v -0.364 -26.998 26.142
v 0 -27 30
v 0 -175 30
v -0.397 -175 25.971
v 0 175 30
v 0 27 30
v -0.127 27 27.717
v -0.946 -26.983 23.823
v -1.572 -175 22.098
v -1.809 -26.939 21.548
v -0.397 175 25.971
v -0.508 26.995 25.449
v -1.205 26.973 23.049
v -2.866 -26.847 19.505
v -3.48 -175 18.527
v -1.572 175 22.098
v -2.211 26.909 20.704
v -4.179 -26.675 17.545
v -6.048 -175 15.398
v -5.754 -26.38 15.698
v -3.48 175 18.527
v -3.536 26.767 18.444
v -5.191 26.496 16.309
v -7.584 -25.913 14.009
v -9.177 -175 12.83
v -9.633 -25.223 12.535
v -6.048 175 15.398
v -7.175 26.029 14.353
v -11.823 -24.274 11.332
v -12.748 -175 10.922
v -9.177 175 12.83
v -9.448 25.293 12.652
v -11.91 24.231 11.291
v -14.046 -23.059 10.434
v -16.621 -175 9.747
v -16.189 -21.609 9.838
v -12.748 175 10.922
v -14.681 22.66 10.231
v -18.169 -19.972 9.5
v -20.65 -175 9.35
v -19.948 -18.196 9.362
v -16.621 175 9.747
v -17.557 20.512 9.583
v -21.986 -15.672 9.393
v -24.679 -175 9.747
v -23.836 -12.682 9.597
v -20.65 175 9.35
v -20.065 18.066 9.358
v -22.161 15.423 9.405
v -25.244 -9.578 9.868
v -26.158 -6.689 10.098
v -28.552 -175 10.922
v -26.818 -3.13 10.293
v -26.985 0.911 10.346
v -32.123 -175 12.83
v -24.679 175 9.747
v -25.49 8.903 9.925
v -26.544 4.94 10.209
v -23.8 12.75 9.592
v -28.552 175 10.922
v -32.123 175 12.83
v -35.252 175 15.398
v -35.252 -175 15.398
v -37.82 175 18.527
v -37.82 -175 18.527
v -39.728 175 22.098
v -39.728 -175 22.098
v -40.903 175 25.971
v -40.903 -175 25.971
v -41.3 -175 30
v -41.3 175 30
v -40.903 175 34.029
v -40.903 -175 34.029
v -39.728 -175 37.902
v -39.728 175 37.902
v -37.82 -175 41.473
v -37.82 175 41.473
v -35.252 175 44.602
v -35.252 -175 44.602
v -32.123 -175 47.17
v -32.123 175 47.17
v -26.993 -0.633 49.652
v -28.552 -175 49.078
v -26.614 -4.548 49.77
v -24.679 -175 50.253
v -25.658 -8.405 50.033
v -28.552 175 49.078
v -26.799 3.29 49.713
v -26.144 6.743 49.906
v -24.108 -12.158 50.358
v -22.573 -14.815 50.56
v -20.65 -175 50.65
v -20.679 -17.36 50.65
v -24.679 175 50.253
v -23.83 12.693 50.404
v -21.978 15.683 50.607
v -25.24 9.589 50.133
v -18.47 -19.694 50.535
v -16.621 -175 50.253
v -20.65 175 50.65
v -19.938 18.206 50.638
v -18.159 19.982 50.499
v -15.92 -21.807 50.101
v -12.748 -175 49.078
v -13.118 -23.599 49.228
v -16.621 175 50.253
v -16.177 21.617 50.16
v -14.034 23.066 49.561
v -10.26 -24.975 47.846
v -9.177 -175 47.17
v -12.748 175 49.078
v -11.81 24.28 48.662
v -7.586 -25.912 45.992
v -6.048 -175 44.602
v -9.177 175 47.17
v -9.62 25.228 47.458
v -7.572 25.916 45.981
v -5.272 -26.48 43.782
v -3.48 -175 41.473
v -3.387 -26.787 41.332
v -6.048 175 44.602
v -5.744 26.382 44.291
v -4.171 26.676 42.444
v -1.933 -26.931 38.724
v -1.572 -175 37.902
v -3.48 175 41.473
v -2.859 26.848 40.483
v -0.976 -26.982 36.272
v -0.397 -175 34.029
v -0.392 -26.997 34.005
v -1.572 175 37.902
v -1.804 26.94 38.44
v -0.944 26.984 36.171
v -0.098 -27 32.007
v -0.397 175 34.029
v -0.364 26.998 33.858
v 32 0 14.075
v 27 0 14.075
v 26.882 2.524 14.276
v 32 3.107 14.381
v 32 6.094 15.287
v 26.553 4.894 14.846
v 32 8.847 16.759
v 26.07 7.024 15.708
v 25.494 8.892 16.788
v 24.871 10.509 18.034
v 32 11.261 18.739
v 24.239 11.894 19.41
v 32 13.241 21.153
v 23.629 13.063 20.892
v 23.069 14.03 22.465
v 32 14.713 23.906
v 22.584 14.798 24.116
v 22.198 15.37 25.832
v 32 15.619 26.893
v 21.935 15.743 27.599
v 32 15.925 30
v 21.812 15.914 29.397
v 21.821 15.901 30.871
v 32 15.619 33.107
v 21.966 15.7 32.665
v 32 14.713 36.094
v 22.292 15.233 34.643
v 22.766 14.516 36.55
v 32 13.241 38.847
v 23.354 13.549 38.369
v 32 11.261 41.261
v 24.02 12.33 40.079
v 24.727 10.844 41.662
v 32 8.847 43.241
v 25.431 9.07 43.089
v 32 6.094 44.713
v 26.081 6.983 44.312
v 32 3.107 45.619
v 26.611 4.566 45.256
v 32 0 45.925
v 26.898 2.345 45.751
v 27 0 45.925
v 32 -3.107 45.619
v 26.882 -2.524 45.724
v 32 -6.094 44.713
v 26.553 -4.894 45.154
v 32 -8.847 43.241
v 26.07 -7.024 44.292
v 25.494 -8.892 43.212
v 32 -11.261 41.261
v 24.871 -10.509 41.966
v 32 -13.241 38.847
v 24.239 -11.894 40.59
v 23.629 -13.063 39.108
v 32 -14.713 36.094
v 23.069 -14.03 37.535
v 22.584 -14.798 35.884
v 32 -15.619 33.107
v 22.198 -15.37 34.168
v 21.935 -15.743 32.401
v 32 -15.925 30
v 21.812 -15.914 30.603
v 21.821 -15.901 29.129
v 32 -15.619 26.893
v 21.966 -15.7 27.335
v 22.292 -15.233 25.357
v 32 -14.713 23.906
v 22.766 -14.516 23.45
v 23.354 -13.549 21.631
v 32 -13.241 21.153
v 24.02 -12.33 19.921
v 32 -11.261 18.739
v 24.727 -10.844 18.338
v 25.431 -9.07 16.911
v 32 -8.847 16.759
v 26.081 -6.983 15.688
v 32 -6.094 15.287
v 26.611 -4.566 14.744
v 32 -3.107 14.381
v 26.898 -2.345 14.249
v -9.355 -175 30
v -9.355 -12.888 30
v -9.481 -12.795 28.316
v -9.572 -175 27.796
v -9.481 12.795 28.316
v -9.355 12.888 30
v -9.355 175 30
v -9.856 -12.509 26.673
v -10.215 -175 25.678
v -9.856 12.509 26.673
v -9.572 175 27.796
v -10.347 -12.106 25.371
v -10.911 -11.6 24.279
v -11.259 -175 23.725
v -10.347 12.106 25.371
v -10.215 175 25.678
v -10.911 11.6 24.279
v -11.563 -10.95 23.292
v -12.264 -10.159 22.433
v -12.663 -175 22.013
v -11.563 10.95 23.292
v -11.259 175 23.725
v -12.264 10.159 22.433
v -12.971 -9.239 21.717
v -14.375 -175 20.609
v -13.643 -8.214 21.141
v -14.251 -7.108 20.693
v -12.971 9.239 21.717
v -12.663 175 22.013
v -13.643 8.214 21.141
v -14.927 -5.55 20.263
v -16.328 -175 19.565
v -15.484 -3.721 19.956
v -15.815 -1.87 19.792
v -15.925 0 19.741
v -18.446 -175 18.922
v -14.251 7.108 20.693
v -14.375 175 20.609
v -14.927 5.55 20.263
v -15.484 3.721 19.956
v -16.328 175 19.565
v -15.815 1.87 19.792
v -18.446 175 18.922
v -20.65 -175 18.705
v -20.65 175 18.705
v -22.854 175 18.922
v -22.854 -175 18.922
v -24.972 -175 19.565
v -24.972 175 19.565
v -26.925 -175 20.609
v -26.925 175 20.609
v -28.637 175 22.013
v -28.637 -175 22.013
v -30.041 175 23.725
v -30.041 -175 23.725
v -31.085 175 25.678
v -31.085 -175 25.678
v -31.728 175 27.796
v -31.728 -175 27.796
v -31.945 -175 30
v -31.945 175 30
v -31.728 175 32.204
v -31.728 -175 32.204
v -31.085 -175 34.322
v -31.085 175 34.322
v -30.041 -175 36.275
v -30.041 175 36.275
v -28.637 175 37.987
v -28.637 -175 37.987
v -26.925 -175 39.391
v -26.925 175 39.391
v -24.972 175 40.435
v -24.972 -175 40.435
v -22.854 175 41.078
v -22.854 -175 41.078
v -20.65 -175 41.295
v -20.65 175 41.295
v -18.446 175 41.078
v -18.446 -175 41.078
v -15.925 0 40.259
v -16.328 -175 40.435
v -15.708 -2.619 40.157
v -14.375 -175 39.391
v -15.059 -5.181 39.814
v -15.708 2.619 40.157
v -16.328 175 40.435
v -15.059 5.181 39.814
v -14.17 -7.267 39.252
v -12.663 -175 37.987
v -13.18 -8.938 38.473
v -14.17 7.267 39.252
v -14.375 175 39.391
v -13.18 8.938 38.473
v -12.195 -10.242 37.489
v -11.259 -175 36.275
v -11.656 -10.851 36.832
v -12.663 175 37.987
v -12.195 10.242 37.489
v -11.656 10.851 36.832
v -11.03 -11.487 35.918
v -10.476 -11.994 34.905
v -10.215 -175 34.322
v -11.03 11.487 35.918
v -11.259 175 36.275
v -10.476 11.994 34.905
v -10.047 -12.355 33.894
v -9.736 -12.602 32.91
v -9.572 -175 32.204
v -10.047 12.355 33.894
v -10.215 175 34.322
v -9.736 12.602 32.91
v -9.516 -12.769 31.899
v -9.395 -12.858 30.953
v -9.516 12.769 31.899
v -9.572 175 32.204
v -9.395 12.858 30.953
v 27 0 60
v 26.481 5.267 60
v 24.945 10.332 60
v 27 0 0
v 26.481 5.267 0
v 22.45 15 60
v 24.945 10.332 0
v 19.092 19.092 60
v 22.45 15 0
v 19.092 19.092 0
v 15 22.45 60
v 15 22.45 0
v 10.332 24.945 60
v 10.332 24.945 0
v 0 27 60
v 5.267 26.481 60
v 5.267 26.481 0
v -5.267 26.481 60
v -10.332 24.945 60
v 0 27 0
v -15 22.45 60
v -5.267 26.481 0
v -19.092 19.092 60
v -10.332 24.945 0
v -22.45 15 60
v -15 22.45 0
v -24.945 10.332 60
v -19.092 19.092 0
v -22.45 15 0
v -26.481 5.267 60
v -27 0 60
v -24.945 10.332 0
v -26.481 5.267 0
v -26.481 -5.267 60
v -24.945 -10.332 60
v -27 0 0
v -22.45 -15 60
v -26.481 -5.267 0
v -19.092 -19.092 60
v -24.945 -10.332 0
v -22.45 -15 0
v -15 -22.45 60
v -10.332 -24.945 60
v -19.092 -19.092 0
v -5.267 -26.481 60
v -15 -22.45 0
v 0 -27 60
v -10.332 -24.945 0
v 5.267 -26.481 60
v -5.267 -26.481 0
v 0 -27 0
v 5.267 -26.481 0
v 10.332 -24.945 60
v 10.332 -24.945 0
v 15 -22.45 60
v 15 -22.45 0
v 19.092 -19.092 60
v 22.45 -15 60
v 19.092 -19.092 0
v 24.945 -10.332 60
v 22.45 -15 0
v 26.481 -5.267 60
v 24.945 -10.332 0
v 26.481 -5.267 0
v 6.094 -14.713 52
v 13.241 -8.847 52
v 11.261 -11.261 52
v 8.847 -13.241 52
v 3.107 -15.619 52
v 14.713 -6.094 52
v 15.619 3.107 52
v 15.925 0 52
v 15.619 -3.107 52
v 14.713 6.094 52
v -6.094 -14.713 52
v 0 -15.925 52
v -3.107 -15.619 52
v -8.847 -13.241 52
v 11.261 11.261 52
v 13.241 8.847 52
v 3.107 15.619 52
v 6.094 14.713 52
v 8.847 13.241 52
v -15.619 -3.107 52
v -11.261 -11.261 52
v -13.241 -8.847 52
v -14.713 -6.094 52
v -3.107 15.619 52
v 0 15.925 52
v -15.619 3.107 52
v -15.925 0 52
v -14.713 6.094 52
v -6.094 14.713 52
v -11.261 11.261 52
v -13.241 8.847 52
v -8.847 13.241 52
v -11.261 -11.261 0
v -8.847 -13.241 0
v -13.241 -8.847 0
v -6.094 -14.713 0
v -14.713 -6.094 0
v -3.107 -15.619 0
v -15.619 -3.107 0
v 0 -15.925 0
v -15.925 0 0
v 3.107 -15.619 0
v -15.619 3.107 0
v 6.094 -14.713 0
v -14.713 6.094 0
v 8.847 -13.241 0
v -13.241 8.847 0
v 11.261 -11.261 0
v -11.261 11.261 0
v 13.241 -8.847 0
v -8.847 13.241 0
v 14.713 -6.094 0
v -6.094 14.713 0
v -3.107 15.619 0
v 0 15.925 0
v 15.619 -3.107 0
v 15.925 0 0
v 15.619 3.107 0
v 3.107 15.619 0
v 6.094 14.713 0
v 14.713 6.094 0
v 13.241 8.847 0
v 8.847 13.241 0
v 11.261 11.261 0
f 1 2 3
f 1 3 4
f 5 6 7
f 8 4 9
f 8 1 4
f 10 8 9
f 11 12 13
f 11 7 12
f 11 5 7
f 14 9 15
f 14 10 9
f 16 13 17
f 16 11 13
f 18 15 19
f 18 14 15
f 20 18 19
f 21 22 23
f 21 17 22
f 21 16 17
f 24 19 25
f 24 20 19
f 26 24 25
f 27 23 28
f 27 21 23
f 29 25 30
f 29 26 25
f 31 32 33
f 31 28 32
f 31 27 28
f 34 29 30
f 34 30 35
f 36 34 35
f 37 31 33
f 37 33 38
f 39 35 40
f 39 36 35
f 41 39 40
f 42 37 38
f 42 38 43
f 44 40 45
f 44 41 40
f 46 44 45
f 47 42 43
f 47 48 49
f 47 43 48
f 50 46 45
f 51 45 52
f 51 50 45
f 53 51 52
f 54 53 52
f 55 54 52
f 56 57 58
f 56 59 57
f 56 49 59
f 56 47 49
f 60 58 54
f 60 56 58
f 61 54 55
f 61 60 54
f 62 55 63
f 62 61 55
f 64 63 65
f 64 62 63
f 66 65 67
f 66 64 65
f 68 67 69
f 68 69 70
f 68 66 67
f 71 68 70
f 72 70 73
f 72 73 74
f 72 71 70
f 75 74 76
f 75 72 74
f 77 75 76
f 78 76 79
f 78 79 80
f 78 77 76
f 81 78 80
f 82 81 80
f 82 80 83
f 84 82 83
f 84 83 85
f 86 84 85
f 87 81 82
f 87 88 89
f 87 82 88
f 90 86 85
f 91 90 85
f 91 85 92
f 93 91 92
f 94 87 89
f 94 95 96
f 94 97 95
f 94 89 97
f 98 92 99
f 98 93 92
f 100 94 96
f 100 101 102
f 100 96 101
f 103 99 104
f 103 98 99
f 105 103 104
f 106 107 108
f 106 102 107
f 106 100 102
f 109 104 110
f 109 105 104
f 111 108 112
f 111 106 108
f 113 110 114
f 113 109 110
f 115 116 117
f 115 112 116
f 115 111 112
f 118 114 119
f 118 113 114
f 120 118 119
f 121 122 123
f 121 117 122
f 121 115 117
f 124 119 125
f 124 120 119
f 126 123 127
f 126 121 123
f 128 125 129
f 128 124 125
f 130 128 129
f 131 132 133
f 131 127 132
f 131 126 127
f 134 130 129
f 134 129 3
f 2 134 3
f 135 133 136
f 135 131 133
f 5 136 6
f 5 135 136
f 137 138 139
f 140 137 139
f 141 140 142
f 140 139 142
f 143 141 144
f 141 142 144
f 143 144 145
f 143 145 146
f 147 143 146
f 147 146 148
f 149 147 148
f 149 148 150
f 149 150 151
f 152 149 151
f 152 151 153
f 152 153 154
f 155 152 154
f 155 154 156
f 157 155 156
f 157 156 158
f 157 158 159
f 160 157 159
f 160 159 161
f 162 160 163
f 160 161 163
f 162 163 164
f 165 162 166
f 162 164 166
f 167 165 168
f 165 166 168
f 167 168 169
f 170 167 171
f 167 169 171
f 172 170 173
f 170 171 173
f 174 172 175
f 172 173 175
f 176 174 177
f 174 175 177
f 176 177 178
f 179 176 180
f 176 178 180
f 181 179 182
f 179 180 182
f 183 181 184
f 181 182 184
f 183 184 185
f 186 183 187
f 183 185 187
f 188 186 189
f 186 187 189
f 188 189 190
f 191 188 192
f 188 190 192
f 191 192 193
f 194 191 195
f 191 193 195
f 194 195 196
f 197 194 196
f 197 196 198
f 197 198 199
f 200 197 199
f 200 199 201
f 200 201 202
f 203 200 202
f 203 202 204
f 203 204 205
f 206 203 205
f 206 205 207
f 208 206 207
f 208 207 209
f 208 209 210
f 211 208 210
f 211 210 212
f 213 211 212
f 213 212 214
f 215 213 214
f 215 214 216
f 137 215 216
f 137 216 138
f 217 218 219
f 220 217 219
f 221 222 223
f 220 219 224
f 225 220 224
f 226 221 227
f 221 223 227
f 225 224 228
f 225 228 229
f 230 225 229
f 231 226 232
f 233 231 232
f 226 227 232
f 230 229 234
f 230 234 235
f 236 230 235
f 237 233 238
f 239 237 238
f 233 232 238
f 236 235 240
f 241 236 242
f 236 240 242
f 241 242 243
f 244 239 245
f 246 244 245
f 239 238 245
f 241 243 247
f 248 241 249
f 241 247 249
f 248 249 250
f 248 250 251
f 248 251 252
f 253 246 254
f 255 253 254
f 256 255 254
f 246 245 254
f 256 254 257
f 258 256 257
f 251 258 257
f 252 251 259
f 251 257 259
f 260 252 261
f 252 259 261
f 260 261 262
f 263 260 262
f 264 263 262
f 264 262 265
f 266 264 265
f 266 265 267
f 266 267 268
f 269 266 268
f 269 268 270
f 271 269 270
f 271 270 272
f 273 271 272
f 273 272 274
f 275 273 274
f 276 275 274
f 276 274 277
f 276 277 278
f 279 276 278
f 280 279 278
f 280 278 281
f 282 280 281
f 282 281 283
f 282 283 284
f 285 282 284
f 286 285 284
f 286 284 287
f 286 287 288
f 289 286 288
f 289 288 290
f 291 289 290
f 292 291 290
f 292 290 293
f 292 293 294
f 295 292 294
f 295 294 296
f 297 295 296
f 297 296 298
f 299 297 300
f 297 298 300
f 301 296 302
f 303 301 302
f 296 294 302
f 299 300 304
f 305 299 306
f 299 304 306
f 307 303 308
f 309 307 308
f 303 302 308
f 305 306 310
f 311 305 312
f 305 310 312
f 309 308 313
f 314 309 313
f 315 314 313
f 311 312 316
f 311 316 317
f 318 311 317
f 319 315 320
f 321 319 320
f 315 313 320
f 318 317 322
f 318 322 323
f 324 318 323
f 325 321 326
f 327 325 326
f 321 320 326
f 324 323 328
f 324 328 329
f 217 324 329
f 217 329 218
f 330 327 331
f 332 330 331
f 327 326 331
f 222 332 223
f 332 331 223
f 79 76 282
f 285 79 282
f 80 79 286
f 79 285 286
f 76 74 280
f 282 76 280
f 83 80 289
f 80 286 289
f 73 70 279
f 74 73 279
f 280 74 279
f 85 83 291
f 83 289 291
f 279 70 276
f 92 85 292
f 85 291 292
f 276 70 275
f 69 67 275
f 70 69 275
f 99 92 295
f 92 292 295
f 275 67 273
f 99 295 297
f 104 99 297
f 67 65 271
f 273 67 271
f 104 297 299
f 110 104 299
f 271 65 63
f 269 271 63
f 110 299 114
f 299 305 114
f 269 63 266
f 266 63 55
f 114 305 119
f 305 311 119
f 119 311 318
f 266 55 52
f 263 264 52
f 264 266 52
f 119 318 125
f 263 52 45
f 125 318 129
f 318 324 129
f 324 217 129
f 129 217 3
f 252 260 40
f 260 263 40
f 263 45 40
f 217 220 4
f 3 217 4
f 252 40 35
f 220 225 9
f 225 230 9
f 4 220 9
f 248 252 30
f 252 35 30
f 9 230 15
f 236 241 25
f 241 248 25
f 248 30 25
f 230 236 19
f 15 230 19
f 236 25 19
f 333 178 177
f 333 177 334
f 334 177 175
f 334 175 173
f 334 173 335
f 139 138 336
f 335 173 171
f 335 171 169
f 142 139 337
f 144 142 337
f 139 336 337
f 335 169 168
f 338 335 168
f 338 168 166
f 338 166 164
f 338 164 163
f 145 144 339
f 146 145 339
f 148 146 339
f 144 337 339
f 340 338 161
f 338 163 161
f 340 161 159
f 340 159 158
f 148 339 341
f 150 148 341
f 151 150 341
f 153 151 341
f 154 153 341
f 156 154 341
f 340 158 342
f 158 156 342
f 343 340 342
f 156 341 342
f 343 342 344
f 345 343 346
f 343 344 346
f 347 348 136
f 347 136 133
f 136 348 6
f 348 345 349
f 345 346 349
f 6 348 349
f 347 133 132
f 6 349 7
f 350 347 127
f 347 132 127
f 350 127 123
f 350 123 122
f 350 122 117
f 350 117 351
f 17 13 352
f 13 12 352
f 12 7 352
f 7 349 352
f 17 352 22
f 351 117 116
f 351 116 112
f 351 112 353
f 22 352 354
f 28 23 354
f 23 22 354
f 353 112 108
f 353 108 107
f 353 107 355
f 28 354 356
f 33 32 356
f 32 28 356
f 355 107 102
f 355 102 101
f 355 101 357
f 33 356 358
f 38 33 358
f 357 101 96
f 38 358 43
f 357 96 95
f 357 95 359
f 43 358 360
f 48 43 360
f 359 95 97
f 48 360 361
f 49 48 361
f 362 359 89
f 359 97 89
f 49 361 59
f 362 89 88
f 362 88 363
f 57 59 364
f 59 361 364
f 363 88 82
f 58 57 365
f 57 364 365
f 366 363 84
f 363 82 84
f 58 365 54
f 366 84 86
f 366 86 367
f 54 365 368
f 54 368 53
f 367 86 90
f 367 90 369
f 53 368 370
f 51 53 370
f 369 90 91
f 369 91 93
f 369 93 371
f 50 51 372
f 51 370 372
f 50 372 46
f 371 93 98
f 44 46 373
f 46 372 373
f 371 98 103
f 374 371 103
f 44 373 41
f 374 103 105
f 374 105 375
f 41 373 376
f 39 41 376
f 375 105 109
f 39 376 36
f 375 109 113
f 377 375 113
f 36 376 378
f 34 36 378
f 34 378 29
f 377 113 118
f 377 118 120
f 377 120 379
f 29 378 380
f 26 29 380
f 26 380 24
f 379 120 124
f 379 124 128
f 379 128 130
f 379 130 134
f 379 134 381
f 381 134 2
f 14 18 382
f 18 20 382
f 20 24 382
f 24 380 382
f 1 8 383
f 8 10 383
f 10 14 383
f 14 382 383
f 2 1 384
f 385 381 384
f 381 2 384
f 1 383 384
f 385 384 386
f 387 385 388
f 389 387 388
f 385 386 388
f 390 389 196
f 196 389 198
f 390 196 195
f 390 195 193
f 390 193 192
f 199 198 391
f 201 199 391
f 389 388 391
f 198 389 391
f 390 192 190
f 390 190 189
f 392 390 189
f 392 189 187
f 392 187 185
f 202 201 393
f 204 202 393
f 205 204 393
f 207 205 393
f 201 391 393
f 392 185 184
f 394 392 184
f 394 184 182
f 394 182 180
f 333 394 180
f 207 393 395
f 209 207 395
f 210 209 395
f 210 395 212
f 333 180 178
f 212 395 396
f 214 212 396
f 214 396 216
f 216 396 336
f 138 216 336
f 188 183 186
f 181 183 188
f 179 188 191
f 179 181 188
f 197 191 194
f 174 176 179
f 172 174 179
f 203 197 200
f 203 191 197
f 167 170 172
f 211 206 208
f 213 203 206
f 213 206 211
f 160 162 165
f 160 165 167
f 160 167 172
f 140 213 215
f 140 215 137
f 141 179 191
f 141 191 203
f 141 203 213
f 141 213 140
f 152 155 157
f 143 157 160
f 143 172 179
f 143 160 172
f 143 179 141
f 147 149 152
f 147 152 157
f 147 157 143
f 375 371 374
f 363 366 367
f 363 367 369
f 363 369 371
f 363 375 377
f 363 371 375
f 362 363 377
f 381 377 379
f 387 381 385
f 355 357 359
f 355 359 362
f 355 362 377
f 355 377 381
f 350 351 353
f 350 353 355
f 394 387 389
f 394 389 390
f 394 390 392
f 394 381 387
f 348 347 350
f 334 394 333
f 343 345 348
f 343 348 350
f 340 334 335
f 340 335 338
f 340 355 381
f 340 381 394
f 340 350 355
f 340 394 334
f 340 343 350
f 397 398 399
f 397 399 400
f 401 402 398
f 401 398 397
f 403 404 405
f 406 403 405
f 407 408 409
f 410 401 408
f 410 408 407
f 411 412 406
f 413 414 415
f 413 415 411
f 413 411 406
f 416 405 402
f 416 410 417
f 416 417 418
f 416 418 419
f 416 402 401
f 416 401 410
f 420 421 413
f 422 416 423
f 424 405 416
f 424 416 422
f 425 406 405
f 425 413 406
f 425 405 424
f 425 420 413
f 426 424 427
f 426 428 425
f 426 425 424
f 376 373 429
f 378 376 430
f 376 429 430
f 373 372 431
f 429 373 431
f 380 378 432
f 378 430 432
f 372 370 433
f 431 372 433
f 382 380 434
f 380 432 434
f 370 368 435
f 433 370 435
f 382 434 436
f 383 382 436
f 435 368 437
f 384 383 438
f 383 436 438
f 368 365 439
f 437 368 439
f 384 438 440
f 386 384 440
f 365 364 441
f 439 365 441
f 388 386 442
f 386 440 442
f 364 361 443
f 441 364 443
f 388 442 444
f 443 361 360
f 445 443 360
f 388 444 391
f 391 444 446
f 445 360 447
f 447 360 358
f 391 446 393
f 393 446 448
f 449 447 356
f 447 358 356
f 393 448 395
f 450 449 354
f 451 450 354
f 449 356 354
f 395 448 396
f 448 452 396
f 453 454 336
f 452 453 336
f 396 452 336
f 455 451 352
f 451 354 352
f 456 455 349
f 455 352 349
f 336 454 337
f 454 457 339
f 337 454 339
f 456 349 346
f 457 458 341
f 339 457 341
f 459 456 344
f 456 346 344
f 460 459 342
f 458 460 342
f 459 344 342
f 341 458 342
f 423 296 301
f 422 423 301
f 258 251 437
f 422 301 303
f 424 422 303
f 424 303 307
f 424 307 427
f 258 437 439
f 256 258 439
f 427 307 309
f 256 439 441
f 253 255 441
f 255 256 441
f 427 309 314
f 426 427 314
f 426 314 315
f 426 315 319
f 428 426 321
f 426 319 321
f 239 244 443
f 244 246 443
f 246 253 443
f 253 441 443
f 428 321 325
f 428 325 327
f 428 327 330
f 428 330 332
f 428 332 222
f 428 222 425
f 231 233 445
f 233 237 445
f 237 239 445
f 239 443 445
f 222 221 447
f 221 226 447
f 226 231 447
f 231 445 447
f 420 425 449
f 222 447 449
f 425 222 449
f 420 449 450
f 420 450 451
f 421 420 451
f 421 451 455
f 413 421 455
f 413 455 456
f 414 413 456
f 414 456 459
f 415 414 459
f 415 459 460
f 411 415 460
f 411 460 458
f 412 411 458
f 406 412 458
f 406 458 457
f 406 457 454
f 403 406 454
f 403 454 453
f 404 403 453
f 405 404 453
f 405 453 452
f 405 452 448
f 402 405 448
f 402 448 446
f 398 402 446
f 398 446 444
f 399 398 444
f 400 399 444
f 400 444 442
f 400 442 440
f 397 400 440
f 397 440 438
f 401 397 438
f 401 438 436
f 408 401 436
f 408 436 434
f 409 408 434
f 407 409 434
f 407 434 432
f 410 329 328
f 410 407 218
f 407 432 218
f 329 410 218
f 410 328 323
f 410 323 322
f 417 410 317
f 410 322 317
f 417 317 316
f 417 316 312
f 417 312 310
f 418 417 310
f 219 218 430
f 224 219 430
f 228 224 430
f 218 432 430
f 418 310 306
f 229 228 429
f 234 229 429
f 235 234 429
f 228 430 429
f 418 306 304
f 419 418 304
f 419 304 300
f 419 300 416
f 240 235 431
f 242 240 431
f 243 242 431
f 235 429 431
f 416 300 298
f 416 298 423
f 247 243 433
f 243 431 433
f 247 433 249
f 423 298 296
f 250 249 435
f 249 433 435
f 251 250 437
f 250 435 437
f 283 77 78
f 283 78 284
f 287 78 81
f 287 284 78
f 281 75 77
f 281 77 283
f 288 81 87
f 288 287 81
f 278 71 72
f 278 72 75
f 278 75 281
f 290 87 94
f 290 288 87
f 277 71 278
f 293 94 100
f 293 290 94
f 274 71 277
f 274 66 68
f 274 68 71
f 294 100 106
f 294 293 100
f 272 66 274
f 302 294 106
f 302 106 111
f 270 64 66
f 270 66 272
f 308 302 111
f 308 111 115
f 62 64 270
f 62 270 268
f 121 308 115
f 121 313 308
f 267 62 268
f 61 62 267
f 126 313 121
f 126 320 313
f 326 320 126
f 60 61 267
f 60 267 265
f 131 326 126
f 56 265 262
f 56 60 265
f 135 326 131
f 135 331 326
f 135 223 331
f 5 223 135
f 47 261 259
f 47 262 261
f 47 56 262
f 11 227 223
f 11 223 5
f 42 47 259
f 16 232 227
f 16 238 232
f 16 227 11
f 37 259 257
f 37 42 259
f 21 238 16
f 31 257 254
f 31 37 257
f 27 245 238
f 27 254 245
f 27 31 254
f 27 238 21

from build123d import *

# Parameters (mm, degrees)
SKETCH1_R           = 27
BOSS_EXTRUDE1_DEPTH = 60
SKETCH2_R           = 20.65
BOSS_EXTRUDE2_DEPTH = 175
SKETCH3_R           = 15.925
BOSS_EXTRUDE3_DEPTH = 32
SKETCH4_R           = 11.295
CUT_EXTRUDE1_DEPTH  = 351.0000001
SKETCH5_R           = 15.925
CUT_EXTRUDE2_DEPTH  = 52


with BuildPart() as part:
    # Sketch1 → Boss-Extrude1 (new body)
    with BuildSketch(Plane.XY):
        Circle(SKETCH1_R)
    extrude(amount=BOSS_EXTRUDE1_DEPTH)

    # Sketch2 → Boss-Extrude2 (add, symmetric)
    with BuildSketch(Plane(origin=(0, 0, 0), x_dir=(1, 0, 0), z_dir=(0, 1, 0))):
        with Locations((-20.65, -30)):
            Circle(SKETCH2_R)
    extrude(amount=BOSS_EXTRUDE2_DEPTH, both=True)

    # Sketch3 → Boss-Extrude3 (add)
    with BuildSketch(Plane(origin=(0, 0, 0), x_dir=(0, 0, -1), z_dir=(1, 0, 0))):
        with Locations((-30, 0)):
            Circle(SKETCH3_R)
    extrude(amount=BOSS_EXTRUDE3_DEPTH)

    # Sketch4 → Cut-Extrude1 (cut, through all)
    with BuildSketch(Plane(origin=(0, 175, 0), x_dir=(1, 0, 0), z_dir=(0, 1, 0))):
        with Locations((-20.65, -30)):
            Circle(SKETCH4_R)
    extrude(amount=-CUT_EXTRUDE1_DEPTH, mode=Mode.SUBTRACT)

    # Sketch5 → Cut-Extrude2 (cut)
    with BuildSketch(Plane(origin=(0, 0, 0), x_dir=(-1, 0, 0), z_dir=(0, 0, -1))):
        Circle(SKETCH5_R)
    extrude(amount=-CUT_EXTRUDE2_DEPTH, mode=Mode.SUBTRACT)


solid = part.part
